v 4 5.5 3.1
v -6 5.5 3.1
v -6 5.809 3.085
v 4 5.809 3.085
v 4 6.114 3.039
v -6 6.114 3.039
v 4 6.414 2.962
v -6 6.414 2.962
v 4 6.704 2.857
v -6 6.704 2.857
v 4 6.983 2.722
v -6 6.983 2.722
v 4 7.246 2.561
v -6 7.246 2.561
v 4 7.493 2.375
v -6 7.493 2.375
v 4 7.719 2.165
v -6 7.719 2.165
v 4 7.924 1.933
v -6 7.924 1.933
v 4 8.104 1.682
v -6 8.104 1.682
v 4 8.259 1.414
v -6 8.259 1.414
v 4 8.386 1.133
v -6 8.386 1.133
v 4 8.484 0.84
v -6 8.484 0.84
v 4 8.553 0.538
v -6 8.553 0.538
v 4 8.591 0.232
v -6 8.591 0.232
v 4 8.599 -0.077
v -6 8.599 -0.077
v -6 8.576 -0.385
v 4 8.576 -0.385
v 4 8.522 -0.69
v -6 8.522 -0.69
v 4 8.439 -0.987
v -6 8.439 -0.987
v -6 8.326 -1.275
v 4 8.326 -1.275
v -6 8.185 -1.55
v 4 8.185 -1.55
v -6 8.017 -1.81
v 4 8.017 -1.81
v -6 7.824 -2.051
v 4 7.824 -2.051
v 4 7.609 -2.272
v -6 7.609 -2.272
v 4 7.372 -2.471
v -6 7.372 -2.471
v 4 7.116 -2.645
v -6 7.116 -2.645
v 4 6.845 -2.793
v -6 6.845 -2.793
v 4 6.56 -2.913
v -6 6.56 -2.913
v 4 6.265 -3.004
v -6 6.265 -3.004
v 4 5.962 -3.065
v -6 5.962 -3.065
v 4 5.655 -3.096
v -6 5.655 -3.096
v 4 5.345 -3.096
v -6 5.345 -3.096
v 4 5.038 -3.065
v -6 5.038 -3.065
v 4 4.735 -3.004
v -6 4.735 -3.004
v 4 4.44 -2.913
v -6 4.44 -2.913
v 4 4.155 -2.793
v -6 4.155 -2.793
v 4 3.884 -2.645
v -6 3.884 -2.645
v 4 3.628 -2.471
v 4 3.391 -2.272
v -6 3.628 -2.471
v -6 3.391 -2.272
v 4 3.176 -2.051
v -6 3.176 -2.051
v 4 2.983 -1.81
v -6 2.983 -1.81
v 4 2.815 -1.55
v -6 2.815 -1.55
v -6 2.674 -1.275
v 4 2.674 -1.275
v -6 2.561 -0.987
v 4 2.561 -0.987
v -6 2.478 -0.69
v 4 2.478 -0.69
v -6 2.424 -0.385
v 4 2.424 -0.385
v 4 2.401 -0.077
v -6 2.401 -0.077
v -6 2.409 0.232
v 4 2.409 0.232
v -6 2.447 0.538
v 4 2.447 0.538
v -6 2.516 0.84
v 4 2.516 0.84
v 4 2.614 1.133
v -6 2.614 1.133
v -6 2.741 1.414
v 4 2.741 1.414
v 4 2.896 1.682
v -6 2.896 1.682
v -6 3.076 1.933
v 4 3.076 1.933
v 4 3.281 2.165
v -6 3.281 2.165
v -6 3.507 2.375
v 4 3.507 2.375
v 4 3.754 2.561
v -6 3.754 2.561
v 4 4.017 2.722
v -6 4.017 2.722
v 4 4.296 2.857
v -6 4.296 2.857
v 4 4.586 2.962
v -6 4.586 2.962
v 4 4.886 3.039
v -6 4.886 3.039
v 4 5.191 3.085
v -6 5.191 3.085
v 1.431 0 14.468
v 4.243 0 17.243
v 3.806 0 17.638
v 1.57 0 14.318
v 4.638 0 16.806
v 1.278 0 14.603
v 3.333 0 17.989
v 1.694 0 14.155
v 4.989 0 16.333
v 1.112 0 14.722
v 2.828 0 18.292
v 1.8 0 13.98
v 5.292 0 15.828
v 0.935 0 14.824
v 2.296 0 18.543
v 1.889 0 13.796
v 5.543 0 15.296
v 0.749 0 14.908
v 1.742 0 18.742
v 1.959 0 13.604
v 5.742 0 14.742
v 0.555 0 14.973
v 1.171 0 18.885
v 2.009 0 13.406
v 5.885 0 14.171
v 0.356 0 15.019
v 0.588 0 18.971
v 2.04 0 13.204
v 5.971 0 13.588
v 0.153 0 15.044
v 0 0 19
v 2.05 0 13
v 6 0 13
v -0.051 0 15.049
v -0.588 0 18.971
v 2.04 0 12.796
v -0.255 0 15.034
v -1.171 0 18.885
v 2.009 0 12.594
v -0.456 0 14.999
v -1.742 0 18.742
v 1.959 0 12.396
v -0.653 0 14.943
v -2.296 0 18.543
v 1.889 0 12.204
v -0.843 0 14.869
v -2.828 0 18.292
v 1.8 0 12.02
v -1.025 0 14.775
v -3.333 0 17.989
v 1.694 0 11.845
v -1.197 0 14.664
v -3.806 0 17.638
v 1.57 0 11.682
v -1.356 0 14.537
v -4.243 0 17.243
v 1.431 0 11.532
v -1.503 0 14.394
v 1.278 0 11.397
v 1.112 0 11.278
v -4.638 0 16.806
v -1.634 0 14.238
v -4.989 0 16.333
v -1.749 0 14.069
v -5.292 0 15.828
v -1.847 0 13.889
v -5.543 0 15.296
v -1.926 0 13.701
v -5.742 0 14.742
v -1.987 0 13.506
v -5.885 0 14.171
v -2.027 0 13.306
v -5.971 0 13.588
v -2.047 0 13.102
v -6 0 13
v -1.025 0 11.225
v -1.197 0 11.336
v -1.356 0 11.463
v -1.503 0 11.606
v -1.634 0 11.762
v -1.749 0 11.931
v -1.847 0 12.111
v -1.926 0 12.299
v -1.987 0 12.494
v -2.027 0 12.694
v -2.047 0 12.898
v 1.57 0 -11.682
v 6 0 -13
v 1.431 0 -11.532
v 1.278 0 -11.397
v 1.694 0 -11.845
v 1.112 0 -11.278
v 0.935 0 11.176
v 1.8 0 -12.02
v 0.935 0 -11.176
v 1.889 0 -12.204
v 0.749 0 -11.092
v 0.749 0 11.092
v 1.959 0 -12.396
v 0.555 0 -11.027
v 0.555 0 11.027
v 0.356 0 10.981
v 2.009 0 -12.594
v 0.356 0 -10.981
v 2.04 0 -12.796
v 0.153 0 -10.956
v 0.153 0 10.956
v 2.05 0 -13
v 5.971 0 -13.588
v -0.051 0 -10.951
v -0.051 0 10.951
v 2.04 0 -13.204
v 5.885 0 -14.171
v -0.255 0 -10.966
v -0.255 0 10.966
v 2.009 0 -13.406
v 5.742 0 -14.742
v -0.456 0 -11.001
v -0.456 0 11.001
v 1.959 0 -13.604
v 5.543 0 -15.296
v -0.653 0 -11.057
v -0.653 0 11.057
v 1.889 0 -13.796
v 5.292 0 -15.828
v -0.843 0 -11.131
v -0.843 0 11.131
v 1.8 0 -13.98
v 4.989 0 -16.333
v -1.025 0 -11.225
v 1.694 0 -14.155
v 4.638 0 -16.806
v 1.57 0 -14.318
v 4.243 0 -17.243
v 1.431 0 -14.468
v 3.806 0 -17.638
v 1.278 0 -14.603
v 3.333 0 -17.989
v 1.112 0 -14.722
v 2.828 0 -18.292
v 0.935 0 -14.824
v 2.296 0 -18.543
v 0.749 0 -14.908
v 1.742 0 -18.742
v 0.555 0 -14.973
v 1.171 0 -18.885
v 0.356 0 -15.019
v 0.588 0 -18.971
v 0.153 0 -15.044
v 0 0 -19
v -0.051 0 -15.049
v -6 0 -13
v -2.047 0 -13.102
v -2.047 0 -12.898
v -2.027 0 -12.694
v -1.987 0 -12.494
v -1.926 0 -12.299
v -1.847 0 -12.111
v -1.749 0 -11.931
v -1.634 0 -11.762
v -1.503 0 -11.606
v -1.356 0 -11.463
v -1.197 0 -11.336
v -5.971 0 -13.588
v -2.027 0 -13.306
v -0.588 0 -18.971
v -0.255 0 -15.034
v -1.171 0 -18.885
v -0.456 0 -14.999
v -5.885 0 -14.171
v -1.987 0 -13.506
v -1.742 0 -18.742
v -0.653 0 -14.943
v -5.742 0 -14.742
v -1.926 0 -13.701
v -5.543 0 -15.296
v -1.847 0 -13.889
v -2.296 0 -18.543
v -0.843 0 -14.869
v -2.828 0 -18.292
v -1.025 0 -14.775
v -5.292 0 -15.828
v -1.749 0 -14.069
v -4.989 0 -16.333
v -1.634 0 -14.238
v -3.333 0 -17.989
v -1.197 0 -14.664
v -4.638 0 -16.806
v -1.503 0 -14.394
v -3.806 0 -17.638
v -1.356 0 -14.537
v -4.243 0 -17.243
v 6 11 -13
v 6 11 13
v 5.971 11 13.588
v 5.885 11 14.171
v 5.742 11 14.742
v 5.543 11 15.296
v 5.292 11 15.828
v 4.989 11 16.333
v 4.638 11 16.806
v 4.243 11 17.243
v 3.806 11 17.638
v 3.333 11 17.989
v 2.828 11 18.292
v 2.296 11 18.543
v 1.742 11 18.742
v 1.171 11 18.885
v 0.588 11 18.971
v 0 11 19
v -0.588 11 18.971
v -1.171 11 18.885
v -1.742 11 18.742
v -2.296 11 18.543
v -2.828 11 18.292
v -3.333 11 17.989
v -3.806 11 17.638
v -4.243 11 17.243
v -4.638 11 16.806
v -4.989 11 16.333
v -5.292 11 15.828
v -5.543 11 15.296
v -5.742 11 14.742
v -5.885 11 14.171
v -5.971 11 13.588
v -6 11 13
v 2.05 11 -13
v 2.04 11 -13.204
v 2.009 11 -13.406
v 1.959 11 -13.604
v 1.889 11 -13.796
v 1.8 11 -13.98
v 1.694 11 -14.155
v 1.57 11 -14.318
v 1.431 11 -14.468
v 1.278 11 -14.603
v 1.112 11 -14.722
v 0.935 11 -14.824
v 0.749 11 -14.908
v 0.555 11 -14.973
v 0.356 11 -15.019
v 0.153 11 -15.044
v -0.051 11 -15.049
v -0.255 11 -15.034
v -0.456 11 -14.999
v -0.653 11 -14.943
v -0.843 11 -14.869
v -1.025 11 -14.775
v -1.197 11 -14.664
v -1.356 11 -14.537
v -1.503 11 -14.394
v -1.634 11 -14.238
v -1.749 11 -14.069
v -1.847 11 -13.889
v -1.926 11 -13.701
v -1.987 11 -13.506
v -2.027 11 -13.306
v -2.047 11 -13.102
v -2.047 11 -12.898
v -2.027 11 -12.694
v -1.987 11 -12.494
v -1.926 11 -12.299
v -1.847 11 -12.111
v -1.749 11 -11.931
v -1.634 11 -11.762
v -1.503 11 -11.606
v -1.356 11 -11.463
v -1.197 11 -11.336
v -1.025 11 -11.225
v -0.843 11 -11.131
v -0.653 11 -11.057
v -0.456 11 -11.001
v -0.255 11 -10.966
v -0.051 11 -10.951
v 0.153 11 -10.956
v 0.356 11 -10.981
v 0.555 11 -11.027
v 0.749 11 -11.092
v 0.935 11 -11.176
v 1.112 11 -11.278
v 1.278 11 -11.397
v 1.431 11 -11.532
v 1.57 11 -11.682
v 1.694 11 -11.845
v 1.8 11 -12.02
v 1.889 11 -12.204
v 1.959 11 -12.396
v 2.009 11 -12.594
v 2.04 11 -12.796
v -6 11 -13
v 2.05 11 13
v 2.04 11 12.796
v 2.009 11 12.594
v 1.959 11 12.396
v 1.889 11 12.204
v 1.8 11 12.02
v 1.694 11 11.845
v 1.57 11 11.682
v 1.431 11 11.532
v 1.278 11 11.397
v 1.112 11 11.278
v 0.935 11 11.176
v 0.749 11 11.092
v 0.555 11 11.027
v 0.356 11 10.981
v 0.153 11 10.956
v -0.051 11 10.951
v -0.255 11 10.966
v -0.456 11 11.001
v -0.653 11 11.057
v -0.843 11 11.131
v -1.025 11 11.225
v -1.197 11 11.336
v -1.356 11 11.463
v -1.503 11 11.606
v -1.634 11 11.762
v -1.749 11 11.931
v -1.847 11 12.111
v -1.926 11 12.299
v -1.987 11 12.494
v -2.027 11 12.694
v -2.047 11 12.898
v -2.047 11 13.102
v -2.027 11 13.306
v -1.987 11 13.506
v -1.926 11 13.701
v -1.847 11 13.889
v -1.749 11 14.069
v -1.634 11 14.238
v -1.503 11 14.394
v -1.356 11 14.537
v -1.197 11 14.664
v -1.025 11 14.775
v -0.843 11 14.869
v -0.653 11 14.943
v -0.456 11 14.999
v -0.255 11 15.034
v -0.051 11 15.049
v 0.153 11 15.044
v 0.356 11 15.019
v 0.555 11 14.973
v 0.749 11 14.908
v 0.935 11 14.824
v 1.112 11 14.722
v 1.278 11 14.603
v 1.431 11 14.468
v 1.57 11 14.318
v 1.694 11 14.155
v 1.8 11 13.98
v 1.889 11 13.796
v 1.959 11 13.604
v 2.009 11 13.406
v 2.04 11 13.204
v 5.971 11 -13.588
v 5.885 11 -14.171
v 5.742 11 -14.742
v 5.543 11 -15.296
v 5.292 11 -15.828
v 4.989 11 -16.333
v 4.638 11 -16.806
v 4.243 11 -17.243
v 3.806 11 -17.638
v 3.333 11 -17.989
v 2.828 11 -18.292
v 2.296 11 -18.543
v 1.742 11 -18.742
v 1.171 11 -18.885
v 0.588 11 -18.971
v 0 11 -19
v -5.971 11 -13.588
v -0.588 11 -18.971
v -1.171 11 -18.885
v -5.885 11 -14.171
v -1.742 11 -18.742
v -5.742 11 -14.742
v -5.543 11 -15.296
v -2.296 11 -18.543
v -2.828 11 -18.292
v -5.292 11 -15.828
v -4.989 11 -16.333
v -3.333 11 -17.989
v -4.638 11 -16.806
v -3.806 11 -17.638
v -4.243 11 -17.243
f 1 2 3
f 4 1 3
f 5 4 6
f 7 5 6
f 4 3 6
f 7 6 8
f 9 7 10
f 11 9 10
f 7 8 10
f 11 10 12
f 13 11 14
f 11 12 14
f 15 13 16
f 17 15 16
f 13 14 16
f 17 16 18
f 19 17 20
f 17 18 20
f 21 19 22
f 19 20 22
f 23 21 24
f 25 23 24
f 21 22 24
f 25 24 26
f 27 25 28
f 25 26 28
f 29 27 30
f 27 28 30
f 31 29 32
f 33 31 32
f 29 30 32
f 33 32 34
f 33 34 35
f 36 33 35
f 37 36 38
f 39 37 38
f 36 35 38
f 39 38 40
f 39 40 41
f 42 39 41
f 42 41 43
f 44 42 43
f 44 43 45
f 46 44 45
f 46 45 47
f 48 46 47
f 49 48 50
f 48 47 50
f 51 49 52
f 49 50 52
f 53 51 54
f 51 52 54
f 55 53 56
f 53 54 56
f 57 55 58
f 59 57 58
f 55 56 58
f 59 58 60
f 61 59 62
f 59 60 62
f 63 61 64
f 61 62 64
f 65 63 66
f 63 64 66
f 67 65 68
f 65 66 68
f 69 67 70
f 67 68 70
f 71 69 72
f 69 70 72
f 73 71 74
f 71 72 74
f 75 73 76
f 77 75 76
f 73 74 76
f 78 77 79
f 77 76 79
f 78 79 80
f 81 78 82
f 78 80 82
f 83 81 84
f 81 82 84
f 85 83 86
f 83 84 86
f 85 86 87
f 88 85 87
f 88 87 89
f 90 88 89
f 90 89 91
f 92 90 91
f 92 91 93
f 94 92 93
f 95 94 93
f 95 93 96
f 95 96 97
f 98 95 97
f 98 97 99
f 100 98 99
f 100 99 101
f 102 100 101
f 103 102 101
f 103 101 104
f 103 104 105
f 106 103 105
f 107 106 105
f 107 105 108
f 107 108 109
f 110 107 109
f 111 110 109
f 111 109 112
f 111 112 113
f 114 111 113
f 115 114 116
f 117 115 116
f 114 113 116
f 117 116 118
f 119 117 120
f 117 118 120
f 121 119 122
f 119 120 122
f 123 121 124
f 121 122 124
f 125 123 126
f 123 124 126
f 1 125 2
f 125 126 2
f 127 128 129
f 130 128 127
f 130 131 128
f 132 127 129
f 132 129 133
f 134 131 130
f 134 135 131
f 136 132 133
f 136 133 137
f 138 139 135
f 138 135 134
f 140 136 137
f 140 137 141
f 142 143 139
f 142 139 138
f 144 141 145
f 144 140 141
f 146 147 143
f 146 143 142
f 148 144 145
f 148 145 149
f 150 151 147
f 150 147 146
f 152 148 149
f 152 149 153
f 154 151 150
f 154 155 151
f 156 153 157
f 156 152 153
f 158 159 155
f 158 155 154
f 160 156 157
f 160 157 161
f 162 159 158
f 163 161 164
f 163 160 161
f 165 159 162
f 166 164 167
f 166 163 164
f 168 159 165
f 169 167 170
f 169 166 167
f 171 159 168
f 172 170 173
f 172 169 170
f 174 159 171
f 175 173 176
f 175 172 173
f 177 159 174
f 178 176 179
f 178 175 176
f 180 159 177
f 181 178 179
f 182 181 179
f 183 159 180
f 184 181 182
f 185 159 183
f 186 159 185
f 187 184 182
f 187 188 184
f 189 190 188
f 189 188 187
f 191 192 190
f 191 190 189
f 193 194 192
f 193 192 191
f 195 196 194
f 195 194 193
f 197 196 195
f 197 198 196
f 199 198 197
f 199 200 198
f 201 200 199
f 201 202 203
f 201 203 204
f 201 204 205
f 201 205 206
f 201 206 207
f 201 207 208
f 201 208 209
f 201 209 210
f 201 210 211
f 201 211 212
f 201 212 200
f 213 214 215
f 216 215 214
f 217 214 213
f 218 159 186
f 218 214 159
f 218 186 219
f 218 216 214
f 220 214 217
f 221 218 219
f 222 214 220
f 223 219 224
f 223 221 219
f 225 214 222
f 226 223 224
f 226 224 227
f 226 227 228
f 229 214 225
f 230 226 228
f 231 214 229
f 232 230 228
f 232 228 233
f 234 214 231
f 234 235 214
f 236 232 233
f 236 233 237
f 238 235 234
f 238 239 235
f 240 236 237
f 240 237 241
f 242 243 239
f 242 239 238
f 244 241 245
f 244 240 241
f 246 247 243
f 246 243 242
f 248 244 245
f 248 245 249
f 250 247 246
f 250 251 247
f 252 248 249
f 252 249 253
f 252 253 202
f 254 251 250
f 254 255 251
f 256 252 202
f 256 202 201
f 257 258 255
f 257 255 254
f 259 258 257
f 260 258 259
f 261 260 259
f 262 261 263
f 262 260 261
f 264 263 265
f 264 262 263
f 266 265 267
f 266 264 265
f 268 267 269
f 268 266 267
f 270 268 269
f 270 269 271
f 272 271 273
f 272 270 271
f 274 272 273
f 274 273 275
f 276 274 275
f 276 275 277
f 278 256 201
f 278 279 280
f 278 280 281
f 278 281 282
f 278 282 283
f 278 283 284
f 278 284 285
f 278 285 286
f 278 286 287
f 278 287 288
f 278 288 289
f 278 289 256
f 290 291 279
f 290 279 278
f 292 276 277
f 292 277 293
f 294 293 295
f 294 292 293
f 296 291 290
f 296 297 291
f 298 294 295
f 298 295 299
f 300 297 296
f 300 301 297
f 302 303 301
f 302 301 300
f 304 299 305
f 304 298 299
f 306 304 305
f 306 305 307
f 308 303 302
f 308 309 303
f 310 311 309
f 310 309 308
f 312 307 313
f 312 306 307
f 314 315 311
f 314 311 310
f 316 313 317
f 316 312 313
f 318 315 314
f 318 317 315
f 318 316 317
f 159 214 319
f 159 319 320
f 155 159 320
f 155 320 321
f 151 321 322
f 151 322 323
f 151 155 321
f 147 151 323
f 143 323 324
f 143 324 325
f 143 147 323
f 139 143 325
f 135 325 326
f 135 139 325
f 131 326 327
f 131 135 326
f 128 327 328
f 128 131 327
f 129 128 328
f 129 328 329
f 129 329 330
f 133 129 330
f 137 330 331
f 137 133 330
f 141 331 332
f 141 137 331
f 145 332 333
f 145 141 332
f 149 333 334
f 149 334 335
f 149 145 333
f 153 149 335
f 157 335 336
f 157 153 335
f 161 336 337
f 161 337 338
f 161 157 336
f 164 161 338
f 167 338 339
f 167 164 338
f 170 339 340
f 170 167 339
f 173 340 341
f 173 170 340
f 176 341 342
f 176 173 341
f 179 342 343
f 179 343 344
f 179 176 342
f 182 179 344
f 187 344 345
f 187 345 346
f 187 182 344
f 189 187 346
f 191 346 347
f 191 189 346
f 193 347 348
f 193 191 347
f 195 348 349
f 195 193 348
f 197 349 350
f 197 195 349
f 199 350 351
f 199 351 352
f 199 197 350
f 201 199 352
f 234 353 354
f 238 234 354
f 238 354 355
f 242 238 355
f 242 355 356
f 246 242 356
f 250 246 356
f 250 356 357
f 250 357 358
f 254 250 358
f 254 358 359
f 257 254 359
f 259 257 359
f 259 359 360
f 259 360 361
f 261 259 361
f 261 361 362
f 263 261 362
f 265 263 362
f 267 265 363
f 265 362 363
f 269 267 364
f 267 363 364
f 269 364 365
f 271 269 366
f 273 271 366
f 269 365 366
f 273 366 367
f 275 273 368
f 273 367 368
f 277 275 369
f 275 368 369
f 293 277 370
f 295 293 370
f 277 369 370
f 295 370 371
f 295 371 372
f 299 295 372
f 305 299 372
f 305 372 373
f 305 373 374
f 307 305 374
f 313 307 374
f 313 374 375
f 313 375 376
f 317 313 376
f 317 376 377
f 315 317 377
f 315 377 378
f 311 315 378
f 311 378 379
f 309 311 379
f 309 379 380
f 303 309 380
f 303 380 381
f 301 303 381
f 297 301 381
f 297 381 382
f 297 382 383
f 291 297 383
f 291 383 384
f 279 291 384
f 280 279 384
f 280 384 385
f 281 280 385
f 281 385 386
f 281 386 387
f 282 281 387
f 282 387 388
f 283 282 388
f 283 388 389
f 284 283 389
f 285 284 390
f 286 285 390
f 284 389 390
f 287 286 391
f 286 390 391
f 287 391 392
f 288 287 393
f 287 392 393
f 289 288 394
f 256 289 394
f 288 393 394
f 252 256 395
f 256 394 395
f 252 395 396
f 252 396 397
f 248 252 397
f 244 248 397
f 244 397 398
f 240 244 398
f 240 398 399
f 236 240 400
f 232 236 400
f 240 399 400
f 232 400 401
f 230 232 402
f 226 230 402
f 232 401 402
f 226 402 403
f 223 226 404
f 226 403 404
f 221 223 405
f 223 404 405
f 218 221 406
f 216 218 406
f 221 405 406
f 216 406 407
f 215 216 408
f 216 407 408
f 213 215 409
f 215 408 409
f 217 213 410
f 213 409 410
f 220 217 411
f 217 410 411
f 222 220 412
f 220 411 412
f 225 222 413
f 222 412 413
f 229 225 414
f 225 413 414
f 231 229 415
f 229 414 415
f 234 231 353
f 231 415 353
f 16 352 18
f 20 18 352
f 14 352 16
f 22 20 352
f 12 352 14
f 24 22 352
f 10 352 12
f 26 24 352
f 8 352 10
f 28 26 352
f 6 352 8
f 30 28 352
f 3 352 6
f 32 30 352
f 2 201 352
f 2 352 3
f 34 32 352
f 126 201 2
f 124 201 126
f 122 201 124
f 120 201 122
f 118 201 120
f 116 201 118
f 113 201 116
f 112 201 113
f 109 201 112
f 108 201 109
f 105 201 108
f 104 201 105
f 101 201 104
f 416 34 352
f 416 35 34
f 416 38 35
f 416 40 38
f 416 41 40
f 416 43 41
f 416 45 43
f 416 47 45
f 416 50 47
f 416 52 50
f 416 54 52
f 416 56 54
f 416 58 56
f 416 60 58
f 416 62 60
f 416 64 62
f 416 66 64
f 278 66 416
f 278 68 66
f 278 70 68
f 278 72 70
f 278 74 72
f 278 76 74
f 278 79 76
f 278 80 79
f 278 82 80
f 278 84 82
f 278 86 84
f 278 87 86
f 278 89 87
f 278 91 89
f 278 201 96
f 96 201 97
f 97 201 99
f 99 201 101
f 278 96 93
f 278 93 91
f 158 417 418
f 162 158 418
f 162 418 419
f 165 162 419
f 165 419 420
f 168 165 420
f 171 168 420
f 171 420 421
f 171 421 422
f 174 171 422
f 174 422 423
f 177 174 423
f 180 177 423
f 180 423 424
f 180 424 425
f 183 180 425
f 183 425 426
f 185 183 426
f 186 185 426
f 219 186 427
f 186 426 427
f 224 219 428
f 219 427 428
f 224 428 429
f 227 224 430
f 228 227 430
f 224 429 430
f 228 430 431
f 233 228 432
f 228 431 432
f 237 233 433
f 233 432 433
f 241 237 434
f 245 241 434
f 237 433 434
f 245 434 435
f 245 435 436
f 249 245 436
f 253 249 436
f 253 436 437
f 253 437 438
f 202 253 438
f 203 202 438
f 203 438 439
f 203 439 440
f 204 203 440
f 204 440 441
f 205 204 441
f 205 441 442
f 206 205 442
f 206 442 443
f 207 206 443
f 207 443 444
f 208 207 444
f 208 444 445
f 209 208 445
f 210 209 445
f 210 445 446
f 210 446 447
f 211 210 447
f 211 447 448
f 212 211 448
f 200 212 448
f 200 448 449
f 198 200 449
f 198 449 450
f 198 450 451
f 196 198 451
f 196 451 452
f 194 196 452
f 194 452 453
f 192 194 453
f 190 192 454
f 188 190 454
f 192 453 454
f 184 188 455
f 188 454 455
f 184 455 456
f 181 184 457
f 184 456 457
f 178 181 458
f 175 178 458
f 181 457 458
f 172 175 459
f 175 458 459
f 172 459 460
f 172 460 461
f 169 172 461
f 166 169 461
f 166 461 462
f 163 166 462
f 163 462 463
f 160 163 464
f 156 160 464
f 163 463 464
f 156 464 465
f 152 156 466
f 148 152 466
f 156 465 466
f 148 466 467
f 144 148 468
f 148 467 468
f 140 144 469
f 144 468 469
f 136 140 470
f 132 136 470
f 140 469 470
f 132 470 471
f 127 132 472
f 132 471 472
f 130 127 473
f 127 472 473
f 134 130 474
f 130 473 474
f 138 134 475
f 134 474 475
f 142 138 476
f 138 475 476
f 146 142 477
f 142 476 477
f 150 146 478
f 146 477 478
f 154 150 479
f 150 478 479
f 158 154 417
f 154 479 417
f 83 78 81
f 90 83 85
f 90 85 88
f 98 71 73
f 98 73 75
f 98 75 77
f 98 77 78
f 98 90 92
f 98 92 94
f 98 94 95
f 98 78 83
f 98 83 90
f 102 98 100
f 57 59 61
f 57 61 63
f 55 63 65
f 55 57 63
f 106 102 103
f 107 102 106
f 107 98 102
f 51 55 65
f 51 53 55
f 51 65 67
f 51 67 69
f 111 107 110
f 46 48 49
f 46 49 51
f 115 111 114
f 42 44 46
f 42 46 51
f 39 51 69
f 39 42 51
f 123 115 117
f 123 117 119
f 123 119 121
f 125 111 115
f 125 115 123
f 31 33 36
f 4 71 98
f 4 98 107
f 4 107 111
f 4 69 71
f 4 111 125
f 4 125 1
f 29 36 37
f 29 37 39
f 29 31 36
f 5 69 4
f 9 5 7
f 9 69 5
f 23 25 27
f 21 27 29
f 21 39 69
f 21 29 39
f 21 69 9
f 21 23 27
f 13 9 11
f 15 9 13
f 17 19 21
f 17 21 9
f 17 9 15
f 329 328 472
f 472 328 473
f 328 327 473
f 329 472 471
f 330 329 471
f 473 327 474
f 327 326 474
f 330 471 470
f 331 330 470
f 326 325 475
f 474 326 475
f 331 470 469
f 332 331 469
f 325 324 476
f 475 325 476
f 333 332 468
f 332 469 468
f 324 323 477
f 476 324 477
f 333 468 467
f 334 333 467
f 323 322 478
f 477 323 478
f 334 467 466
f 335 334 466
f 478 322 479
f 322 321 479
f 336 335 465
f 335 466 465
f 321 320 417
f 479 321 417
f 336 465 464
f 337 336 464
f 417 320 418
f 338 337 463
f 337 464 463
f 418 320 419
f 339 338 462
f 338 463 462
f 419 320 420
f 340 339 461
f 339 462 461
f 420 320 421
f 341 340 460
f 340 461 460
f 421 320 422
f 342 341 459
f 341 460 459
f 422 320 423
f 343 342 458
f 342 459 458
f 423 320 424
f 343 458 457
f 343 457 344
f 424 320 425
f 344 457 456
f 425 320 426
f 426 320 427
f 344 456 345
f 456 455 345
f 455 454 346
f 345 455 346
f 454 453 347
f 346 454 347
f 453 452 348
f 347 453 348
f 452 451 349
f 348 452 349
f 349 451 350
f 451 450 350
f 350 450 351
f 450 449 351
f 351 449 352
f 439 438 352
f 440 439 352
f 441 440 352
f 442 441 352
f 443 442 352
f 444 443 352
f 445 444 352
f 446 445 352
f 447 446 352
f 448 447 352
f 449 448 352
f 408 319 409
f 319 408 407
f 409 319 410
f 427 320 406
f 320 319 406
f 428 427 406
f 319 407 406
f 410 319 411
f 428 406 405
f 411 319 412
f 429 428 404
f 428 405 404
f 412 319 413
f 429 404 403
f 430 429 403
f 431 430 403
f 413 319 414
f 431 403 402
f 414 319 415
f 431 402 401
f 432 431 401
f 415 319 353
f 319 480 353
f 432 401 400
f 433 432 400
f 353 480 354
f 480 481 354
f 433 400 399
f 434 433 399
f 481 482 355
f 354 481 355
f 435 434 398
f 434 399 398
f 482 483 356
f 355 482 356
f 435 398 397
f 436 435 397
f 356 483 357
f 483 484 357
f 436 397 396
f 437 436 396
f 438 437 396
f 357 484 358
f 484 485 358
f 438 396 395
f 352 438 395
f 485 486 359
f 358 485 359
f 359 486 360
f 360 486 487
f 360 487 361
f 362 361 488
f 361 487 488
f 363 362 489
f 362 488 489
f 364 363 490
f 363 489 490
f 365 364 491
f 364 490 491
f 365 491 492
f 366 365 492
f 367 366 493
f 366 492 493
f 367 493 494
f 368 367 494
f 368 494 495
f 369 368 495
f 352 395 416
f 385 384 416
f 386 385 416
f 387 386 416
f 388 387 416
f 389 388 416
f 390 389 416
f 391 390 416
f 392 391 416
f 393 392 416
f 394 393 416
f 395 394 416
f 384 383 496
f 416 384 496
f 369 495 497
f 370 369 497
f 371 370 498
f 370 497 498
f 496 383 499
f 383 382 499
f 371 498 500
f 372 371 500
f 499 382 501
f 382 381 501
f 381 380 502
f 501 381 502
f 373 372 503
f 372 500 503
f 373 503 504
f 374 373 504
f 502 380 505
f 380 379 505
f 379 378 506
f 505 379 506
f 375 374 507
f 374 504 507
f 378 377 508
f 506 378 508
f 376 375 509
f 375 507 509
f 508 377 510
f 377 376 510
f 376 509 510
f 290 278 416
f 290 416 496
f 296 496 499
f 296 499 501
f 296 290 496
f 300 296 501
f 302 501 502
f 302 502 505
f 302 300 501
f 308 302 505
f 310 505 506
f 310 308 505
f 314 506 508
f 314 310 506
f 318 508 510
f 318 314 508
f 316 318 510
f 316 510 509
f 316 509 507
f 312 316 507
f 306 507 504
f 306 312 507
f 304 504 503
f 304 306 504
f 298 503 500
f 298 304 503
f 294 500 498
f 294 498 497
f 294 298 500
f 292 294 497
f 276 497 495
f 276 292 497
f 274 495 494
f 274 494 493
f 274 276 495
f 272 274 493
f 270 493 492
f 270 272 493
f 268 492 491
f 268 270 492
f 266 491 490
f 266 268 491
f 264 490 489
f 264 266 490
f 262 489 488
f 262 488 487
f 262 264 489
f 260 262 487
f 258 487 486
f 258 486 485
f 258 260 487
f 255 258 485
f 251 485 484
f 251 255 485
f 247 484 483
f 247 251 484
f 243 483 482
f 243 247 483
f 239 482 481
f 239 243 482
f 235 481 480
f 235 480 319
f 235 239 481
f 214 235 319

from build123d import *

# Parameters (mm, degrees)
EXTRUDE_1_DEPTH     = 11
SKETCH_2_R          = 2.05
CUT_EXTRUDE_1_DEPTH = 12
SKETCH_3_R          = 3.1
CUT_EXTRUDE_2_DEPTH = 10


with BuildPart() as part:
    # 草图1 → 凸台-拉伸1 (new body)
    with BuildSketch(Plane(origin=(0, 0, 0), x_dir=(1, 0, 0), z_dir=(0, 1, 0))):
        with BuildLine():
            Line((-6, -13), (-6, 13))
            ThreePointArc((-6, 13), (0, 19), (6, 13))
            Line((6, 13), (6, -13))
            ThreePointArc((6, -13), (0, -19), (-6, -13))
        make_face()
    extrude(amount=EXTRUDE_1_DEPTH)

    # 草图2 → 切除-拉伸1 (cut, through all)
    with BuildSketch(Plane(origin=(0, 11, 0), x_dir=(1, 0, 0), z_dir=(0, 1, 0))):
        with Locations((0, 13)):
            Circle(SKETCH_2_R)
        with Locations((0, -13)):
            Circle(SKETCH_2_R)
    extrude(amount=-CUT_EXTRUDE_1_DEPTH, mode=Mode.SUBTRACT)

    # 草图3 → 切除-拉伸2 (cut)
    with BuildSketch(Plane.ZY.offset(6)):
        with Locations((0, 5.5)):
            Circle(SKETCH_3_R)
    extrude(amount=-CUT_EXTRUDE_2_DEPTH, mode=Mode.SUBTRACT)


solid = part.part
